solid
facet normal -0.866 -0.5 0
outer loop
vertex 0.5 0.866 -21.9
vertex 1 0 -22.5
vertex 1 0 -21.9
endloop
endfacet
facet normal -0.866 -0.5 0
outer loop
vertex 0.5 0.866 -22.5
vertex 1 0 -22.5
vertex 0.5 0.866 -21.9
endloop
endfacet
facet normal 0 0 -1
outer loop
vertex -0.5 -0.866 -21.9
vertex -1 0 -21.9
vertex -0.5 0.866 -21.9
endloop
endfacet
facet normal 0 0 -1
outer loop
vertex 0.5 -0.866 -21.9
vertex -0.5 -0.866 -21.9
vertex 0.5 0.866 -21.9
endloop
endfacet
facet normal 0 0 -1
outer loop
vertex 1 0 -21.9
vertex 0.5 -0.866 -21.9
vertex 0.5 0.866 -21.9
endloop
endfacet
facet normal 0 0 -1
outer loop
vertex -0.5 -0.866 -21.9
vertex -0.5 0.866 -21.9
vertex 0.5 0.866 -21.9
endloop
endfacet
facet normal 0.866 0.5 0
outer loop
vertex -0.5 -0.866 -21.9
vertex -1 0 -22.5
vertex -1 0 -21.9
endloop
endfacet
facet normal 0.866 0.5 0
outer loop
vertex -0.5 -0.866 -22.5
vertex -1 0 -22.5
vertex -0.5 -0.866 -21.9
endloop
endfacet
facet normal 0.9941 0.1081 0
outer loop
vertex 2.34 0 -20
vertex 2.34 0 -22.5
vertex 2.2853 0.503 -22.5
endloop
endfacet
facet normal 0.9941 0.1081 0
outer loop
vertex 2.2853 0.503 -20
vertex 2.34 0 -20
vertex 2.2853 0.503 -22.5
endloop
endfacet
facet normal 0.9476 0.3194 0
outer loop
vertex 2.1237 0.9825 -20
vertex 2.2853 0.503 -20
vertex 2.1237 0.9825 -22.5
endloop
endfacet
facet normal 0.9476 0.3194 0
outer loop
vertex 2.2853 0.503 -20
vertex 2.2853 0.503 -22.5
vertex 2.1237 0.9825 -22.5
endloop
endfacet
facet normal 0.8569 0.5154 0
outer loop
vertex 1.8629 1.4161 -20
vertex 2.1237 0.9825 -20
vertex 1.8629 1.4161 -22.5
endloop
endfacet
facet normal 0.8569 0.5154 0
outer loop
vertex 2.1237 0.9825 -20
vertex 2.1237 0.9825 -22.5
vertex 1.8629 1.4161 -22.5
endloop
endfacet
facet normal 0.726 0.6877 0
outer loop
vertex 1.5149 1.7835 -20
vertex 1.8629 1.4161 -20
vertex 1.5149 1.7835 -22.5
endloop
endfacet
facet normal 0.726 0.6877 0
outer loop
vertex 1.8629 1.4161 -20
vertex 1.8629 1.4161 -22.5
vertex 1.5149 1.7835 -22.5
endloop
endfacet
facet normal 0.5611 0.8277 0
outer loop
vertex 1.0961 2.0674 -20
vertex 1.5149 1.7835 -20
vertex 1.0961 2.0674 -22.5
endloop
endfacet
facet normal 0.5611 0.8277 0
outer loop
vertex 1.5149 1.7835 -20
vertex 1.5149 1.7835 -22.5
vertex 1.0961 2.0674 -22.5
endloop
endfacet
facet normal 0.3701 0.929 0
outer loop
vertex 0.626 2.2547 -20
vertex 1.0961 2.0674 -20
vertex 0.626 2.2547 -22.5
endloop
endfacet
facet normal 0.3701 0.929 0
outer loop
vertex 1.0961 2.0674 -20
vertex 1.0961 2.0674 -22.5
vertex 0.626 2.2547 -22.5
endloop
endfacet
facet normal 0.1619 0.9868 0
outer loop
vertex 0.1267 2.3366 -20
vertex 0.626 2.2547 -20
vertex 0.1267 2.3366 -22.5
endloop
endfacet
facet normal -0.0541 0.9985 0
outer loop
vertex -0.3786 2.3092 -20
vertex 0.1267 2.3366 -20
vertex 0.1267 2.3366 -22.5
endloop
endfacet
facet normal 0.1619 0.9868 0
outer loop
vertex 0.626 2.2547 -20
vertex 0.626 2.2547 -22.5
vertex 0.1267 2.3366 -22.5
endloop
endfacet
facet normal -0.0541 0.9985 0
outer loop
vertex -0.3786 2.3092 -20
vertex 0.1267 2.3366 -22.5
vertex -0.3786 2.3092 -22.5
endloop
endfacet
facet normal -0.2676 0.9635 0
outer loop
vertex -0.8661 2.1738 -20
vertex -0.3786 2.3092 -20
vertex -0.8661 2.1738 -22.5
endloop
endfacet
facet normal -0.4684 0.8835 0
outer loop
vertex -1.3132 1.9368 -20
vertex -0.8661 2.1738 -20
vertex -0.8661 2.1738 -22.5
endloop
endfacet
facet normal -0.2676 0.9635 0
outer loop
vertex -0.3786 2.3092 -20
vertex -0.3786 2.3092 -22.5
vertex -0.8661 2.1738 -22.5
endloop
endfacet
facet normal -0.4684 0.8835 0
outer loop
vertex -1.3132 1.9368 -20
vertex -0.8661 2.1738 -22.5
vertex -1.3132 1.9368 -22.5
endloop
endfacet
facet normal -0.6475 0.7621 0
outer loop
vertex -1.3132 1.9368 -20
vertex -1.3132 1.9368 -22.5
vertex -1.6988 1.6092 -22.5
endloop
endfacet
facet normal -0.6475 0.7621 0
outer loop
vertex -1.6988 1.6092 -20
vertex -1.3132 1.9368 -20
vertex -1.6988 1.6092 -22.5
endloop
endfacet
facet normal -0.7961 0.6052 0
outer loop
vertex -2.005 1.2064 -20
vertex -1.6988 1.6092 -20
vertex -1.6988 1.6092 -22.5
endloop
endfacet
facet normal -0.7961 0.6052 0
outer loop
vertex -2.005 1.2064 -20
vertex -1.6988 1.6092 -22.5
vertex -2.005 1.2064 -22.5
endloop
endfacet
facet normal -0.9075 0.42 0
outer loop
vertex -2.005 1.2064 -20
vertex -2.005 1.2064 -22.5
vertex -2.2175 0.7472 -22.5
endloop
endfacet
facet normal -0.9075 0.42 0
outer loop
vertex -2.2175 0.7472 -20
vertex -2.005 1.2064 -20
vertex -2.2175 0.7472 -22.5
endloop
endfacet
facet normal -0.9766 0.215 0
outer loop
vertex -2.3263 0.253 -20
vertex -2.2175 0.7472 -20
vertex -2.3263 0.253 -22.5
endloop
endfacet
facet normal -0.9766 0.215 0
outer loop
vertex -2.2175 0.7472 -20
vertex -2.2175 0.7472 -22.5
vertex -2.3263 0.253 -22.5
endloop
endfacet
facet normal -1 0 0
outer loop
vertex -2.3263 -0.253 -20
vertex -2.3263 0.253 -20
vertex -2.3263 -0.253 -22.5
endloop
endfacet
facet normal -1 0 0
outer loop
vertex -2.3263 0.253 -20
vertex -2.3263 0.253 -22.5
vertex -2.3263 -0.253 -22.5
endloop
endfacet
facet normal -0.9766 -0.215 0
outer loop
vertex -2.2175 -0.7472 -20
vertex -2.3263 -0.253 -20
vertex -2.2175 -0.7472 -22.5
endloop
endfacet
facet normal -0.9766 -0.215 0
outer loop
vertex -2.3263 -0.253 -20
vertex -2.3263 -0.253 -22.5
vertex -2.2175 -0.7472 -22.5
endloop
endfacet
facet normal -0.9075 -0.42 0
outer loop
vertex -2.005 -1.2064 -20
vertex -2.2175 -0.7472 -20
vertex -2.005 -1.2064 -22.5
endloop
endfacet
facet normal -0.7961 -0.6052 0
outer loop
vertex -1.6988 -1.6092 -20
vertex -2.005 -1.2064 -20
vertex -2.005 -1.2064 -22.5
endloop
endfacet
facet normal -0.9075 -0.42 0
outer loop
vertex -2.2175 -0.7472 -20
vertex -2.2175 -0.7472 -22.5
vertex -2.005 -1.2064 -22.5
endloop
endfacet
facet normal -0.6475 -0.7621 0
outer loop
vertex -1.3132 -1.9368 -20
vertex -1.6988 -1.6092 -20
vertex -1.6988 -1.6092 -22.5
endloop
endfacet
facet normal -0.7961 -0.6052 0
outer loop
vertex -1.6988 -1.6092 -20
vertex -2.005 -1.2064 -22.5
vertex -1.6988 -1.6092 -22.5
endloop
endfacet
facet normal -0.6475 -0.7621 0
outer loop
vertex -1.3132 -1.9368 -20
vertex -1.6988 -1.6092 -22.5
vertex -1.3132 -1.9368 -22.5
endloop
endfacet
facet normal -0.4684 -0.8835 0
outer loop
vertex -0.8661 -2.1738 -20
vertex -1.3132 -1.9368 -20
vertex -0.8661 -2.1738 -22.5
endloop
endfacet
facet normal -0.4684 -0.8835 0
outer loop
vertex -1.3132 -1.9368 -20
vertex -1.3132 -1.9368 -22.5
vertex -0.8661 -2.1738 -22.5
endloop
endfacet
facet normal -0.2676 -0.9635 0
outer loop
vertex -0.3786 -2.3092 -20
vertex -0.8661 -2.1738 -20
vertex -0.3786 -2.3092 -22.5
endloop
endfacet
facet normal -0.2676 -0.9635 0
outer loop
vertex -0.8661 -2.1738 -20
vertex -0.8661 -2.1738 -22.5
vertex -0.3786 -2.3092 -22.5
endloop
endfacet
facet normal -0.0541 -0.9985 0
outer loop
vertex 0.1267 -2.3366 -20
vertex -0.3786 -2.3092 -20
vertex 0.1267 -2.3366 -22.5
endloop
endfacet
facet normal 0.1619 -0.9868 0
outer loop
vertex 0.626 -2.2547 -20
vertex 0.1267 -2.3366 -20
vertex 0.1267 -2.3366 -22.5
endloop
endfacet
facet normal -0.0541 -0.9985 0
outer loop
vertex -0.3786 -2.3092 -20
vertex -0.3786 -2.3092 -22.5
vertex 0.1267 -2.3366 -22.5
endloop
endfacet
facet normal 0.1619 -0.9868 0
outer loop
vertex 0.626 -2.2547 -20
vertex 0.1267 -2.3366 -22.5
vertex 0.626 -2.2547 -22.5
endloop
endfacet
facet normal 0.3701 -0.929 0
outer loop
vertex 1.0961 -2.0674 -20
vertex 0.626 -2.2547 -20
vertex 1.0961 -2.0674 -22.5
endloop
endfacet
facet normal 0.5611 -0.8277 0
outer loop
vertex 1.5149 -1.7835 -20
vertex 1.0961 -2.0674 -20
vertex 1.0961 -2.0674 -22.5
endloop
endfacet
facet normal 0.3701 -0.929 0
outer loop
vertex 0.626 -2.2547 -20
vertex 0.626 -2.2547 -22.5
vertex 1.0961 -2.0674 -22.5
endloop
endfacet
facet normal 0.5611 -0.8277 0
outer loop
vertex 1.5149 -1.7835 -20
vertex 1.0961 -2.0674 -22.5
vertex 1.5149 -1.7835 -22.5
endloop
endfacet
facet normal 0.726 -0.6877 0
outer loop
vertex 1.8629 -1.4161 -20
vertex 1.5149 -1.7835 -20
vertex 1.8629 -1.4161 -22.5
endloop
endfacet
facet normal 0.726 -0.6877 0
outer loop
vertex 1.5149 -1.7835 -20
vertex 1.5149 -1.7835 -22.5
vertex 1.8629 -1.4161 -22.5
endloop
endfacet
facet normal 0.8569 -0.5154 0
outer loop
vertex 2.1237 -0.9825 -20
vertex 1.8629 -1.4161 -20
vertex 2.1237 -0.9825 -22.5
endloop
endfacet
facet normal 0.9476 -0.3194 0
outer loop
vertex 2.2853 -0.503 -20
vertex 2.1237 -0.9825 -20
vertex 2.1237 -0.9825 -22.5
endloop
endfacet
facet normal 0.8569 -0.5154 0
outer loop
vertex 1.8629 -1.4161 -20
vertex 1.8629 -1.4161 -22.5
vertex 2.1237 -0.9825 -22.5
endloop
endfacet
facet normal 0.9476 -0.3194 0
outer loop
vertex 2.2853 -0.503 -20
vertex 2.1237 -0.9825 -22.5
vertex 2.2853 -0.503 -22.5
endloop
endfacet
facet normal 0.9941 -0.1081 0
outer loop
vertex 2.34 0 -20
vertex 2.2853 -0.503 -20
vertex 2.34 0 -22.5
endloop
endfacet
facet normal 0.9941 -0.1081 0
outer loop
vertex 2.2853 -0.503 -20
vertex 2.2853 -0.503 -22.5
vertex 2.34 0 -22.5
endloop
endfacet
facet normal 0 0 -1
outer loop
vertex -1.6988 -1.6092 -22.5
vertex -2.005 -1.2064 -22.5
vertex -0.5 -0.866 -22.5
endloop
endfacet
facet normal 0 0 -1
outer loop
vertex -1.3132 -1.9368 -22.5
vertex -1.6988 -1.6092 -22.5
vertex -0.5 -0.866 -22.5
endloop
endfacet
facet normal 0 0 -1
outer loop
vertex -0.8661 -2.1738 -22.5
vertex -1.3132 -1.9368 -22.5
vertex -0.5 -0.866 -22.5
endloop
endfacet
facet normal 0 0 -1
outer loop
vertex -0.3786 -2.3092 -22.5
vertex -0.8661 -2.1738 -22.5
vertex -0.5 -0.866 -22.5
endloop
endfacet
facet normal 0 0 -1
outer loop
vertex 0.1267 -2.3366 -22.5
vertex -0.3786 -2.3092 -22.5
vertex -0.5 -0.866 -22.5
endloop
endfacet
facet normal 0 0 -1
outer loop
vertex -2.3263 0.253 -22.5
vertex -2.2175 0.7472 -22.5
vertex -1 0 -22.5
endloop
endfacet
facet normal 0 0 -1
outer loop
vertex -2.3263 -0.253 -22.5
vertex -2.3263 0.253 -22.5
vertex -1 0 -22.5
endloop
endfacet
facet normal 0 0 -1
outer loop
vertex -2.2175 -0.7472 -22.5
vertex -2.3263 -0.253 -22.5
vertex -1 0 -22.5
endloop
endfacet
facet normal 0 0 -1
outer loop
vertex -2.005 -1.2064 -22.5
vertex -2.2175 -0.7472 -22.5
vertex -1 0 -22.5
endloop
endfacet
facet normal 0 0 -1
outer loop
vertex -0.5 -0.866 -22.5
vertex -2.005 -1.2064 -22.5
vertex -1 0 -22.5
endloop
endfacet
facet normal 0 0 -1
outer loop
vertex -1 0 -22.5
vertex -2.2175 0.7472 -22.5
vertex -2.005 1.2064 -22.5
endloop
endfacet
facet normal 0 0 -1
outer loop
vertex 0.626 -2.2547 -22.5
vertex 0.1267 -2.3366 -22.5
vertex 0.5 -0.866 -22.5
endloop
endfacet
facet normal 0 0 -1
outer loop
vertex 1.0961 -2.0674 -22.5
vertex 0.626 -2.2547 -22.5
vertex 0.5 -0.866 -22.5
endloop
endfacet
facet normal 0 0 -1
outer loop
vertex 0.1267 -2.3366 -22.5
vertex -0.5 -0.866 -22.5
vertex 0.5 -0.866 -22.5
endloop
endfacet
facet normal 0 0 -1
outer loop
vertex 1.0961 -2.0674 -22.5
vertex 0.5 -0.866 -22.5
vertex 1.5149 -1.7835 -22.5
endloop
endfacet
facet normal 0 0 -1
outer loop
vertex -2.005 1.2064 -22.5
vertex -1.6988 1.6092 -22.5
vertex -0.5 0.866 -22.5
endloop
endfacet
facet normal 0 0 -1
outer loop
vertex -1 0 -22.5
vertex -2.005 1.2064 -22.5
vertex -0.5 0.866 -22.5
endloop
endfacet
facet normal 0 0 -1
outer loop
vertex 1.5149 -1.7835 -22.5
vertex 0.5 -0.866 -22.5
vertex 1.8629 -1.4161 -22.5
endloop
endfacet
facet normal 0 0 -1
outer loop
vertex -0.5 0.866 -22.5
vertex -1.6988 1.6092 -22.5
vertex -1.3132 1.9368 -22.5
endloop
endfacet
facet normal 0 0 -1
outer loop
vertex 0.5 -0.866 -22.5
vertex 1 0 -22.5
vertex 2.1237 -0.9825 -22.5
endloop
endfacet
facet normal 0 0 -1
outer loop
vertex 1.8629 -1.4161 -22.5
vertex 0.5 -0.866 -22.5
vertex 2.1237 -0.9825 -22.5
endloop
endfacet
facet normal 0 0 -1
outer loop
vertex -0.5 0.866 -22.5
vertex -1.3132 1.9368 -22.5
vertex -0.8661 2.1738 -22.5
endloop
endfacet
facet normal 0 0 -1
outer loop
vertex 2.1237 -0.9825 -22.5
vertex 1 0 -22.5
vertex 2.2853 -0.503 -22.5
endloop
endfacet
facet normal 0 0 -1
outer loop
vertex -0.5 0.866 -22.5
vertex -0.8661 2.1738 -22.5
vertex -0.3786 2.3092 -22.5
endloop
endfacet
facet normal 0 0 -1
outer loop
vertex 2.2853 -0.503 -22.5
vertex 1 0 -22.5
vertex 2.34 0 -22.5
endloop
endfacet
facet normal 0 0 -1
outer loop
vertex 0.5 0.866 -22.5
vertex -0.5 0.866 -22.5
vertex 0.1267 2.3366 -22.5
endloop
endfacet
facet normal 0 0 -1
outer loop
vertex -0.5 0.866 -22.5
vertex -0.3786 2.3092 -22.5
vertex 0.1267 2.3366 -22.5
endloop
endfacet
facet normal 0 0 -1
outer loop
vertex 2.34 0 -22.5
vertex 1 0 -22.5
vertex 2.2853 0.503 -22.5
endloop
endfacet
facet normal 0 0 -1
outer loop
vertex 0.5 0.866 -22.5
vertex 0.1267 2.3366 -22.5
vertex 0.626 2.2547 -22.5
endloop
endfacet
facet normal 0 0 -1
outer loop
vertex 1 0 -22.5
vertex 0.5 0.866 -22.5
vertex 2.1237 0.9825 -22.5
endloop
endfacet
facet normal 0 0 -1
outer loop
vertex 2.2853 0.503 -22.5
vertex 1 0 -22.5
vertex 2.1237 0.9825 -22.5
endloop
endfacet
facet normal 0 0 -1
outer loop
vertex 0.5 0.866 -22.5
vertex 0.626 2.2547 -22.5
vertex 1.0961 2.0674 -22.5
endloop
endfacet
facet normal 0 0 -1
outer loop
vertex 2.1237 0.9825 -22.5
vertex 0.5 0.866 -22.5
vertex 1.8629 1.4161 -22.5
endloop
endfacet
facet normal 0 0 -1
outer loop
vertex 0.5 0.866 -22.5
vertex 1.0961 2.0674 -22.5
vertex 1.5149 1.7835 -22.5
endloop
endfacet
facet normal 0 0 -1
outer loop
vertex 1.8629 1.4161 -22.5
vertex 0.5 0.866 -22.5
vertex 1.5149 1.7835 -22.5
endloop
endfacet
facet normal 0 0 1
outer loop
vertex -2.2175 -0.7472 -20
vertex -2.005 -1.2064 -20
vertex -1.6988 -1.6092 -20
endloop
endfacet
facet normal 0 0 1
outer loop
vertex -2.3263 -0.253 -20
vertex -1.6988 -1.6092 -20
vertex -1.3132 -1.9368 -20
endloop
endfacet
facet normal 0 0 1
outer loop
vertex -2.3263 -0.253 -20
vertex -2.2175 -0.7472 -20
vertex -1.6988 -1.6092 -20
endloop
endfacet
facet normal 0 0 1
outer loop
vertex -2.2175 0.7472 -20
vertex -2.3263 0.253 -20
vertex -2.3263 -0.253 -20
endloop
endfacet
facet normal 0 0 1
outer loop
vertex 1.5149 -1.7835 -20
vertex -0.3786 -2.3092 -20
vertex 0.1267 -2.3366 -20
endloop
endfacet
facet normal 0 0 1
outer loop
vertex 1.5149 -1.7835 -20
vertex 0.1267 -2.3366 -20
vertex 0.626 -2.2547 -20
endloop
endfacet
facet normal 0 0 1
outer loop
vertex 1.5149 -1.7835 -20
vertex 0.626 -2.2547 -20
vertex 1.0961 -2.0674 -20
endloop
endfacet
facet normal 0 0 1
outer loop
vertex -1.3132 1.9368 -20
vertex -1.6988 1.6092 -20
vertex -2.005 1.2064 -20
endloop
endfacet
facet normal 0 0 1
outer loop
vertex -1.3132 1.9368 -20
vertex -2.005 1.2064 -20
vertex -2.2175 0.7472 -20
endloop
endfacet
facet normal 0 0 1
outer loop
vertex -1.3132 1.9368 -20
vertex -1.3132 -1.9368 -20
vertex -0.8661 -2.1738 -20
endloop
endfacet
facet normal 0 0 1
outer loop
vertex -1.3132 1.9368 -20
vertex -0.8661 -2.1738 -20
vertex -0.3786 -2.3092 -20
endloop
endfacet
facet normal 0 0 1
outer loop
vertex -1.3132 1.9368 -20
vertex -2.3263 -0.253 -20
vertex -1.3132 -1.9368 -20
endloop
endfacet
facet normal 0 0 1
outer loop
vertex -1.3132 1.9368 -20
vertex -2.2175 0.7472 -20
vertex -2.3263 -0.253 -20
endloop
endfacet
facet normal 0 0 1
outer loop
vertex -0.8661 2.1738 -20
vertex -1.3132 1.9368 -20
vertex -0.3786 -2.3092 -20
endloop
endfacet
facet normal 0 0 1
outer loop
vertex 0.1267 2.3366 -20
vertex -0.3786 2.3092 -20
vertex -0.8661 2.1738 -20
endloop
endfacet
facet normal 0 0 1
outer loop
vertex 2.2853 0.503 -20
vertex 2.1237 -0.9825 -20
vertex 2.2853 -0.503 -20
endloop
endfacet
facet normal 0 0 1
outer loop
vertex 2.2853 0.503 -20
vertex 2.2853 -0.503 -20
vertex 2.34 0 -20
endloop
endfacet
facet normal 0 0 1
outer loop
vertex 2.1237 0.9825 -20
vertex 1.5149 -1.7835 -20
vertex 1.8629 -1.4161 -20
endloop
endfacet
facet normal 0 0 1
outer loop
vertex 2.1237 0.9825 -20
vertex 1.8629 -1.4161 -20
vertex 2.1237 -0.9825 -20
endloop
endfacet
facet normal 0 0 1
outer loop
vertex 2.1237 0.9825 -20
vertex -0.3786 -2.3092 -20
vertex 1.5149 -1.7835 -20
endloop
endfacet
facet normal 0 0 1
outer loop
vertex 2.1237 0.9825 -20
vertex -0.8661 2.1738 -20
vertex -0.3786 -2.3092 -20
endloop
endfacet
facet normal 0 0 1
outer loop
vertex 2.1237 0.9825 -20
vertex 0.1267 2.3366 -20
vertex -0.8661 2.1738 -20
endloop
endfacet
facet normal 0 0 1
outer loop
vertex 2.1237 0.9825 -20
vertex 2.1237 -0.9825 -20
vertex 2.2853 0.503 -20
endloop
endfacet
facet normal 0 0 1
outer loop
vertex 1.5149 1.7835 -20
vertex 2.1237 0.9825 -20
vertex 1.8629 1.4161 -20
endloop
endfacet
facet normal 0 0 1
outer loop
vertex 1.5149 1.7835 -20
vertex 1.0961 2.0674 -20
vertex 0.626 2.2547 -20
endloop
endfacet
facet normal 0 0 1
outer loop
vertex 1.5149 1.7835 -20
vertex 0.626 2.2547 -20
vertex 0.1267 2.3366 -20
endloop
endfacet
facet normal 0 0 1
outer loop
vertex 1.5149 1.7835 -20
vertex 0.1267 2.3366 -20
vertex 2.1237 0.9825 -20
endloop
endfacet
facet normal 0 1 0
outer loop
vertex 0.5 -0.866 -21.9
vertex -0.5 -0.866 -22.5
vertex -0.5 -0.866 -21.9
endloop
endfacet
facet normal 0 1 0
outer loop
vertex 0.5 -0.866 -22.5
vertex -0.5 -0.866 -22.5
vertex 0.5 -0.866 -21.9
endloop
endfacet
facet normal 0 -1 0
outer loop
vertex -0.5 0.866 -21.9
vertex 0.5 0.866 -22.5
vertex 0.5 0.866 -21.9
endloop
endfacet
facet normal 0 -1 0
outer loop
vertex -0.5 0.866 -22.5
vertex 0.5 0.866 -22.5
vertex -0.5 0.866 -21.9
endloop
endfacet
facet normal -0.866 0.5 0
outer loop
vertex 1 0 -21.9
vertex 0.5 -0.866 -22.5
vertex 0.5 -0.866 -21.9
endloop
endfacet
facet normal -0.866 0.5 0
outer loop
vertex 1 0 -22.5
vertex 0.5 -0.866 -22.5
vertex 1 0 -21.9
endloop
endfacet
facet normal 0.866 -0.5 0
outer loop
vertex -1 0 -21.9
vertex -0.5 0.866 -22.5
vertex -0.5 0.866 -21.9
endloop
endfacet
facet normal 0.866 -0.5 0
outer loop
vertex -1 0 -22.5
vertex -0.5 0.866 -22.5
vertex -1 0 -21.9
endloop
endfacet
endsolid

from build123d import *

# Parameters (mm, degrees)
PRISM009_DEPTH    = 1.1
CYLINDER054_R     = 2.34
CYLINDER054_DEPTH = 2.5


with BuildPart() as prism009:
    # Prism009 → Prism009 (new body)
    with BuildSketch(Plane.XY.offset(-23)):
        Polygon((1, 0), (0.5, 0.866025), (-0.5, 0.866025), (-1, 0), (-0.5, -0.866025), (0.5, -0.866025), align=None)
    extrude(amount=PRISM009_DEPTH)


with BuildPart() as cut044:
    # Cylinder054 → Cylinder054 (new body)
    with BuildSketch(Plane.XY.offset(-22.5)):
        Circle(CYLINDER054_R)
    extrude(amount=CYLINDER054_DEPTH)

    # Cut044: cut Prism009
    add(prism009.part, mode=Mode.SUBTRACT)


solid = cut044.part
